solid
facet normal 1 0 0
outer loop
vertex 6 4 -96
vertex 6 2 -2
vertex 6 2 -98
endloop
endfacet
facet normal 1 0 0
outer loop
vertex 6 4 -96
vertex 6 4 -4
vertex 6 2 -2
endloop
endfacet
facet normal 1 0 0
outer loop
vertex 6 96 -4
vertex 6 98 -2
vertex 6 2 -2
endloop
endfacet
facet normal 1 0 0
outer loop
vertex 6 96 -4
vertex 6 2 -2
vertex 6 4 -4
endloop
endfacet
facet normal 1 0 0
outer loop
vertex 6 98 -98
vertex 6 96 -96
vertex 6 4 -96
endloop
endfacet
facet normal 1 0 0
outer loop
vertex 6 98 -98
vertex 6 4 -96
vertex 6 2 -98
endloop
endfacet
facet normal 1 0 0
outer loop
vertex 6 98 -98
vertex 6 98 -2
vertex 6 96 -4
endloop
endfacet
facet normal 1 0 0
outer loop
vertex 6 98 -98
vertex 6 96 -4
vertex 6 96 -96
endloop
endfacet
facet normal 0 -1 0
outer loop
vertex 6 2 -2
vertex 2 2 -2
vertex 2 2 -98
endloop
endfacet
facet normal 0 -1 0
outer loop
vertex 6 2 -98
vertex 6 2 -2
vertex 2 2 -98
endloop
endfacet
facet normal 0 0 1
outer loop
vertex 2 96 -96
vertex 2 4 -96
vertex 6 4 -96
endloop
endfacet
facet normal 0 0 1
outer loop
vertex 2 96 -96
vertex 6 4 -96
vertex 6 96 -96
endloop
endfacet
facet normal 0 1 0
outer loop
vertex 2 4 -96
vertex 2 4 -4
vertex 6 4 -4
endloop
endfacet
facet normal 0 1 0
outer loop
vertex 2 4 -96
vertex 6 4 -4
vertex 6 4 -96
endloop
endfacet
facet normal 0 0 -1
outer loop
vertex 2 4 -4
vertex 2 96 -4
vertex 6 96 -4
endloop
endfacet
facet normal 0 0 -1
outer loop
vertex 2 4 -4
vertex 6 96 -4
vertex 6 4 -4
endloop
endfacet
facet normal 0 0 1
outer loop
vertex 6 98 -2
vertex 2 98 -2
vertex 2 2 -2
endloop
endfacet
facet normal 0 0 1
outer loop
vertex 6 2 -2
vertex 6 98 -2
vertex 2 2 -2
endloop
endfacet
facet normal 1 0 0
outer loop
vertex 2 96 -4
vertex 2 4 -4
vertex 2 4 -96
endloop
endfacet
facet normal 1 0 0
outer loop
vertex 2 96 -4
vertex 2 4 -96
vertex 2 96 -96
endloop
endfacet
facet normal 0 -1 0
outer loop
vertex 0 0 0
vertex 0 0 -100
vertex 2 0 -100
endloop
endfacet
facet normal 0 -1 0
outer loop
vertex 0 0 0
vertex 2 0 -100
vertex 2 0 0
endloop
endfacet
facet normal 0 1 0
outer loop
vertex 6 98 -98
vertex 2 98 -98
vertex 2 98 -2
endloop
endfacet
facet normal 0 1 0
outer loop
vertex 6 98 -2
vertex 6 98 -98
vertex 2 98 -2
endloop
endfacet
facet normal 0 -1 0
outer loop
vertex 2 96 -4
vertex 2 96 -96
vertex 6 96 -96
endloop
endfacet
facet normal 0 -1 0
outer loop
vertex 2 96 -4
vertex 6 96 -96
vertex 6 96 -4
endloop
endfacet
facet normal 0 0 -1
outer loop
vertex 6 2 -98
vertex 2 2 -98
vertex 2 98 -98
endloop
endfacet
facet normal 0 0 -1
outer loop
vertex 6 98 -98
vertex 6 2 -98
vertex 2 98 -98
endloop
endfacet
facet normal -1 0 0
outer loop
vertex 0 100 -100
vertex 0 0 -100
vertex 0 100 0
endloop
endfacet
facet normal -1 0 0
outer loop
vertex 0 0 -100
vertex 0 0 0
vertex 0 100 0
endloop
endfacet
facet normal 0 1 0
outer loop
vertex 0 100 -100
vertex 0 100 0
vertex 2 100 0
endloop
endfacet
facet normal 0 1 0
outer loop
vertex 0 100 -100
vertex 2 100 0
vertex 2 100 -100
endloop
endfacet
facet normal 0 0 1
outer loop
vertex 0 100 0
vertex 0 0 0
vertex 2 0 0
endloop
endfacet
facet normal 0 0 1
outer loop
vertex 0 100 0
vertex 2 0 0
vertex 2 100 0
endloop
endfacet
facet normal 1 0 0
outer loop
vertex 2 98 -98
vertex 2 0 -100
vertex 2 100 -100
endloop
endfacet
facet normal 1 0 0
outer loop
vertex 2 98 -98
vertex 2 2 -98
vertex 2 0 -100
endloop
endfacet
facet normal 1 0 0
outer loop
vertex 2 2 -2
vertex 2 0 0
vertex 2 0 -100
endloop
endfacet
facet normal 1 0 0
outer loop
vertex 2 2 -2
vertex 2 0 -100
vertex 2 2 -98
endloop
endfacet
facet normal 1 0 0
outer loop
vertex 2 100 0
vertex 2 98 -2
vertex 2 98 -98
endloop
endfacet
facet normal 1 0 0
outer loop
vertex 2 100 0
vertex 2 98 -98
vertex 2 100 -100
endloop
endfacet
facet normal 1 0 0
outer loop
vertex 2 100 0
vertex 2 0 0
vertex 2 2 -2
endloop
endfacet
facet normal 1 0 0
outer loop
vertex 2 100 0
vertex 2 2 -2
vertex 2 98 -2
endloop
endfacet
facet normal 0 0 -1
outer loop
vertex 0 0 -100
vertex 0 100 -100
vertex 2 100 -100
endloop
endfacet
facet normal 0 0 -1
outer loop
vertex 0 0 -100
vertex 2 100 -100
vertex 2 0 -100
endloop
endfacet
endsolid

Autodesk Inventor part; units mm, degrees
ref_plane "YZ Plane" through (0, 0, 0) normal (1, 0, 0) x (0, 1, 0)
ref_plane "XZ Plane" through (0, 0, 0) normal (0, 1, 0) x (-1, 0, 0)
ref_plane "XY Plane" through (0, 0, 0) normal (0, 0, 1) x (1, 0, 0)
sketch "Náčrt1" plane through (0, 0, 0) normal (1, 0, 0) x (0, 1, 0)
  line L0 (0, 0) -> (100, 0)
  line L1 (100, 0) -> (100, -100)
  line L2 (100, -100) -> (0, -100)
  line L3 (0, -100) -> (0, 0)
  dimension "d0" = 100
  dimension "d1" = 100
extrude "Vysunutí1" add sketch "Náčrt1" along normal blind 2
sketch "Náčrt2" plane through (2, 0, 0) normal (1, 0, 0) x (0, 0, -1)
  line L0 (0, 100) -> (0, 0) projected
  line L1 (0, 0) -> (100, 0) projected
  line L2 (100, 0) -> (100, 100) projected
  line L3 (100, 100) -> (0, 100) projected
  line L4 (2, 98) -> (2, 2)
  line L5 (2, 2) -> (98, 2)
  line L6 (98, 2) -> (98, 98)
  line L7 (98, 98) -> (2, 98)
  line L8 (4, 96) -> (4, 4)
  line L9 (4, 4) -> (96, 4)
  line L10 (96, 4) -> (96, 96)
  line L11 (96, 96) -> (4, 96)
  dimension "d4" = 2
  dimension "d5" = 2
extrude "Vysunutí2" add sketch "Náčrt2" along normal blind 4 contours L7 L6 L5 L4
properties part number "Zadní kryt"
